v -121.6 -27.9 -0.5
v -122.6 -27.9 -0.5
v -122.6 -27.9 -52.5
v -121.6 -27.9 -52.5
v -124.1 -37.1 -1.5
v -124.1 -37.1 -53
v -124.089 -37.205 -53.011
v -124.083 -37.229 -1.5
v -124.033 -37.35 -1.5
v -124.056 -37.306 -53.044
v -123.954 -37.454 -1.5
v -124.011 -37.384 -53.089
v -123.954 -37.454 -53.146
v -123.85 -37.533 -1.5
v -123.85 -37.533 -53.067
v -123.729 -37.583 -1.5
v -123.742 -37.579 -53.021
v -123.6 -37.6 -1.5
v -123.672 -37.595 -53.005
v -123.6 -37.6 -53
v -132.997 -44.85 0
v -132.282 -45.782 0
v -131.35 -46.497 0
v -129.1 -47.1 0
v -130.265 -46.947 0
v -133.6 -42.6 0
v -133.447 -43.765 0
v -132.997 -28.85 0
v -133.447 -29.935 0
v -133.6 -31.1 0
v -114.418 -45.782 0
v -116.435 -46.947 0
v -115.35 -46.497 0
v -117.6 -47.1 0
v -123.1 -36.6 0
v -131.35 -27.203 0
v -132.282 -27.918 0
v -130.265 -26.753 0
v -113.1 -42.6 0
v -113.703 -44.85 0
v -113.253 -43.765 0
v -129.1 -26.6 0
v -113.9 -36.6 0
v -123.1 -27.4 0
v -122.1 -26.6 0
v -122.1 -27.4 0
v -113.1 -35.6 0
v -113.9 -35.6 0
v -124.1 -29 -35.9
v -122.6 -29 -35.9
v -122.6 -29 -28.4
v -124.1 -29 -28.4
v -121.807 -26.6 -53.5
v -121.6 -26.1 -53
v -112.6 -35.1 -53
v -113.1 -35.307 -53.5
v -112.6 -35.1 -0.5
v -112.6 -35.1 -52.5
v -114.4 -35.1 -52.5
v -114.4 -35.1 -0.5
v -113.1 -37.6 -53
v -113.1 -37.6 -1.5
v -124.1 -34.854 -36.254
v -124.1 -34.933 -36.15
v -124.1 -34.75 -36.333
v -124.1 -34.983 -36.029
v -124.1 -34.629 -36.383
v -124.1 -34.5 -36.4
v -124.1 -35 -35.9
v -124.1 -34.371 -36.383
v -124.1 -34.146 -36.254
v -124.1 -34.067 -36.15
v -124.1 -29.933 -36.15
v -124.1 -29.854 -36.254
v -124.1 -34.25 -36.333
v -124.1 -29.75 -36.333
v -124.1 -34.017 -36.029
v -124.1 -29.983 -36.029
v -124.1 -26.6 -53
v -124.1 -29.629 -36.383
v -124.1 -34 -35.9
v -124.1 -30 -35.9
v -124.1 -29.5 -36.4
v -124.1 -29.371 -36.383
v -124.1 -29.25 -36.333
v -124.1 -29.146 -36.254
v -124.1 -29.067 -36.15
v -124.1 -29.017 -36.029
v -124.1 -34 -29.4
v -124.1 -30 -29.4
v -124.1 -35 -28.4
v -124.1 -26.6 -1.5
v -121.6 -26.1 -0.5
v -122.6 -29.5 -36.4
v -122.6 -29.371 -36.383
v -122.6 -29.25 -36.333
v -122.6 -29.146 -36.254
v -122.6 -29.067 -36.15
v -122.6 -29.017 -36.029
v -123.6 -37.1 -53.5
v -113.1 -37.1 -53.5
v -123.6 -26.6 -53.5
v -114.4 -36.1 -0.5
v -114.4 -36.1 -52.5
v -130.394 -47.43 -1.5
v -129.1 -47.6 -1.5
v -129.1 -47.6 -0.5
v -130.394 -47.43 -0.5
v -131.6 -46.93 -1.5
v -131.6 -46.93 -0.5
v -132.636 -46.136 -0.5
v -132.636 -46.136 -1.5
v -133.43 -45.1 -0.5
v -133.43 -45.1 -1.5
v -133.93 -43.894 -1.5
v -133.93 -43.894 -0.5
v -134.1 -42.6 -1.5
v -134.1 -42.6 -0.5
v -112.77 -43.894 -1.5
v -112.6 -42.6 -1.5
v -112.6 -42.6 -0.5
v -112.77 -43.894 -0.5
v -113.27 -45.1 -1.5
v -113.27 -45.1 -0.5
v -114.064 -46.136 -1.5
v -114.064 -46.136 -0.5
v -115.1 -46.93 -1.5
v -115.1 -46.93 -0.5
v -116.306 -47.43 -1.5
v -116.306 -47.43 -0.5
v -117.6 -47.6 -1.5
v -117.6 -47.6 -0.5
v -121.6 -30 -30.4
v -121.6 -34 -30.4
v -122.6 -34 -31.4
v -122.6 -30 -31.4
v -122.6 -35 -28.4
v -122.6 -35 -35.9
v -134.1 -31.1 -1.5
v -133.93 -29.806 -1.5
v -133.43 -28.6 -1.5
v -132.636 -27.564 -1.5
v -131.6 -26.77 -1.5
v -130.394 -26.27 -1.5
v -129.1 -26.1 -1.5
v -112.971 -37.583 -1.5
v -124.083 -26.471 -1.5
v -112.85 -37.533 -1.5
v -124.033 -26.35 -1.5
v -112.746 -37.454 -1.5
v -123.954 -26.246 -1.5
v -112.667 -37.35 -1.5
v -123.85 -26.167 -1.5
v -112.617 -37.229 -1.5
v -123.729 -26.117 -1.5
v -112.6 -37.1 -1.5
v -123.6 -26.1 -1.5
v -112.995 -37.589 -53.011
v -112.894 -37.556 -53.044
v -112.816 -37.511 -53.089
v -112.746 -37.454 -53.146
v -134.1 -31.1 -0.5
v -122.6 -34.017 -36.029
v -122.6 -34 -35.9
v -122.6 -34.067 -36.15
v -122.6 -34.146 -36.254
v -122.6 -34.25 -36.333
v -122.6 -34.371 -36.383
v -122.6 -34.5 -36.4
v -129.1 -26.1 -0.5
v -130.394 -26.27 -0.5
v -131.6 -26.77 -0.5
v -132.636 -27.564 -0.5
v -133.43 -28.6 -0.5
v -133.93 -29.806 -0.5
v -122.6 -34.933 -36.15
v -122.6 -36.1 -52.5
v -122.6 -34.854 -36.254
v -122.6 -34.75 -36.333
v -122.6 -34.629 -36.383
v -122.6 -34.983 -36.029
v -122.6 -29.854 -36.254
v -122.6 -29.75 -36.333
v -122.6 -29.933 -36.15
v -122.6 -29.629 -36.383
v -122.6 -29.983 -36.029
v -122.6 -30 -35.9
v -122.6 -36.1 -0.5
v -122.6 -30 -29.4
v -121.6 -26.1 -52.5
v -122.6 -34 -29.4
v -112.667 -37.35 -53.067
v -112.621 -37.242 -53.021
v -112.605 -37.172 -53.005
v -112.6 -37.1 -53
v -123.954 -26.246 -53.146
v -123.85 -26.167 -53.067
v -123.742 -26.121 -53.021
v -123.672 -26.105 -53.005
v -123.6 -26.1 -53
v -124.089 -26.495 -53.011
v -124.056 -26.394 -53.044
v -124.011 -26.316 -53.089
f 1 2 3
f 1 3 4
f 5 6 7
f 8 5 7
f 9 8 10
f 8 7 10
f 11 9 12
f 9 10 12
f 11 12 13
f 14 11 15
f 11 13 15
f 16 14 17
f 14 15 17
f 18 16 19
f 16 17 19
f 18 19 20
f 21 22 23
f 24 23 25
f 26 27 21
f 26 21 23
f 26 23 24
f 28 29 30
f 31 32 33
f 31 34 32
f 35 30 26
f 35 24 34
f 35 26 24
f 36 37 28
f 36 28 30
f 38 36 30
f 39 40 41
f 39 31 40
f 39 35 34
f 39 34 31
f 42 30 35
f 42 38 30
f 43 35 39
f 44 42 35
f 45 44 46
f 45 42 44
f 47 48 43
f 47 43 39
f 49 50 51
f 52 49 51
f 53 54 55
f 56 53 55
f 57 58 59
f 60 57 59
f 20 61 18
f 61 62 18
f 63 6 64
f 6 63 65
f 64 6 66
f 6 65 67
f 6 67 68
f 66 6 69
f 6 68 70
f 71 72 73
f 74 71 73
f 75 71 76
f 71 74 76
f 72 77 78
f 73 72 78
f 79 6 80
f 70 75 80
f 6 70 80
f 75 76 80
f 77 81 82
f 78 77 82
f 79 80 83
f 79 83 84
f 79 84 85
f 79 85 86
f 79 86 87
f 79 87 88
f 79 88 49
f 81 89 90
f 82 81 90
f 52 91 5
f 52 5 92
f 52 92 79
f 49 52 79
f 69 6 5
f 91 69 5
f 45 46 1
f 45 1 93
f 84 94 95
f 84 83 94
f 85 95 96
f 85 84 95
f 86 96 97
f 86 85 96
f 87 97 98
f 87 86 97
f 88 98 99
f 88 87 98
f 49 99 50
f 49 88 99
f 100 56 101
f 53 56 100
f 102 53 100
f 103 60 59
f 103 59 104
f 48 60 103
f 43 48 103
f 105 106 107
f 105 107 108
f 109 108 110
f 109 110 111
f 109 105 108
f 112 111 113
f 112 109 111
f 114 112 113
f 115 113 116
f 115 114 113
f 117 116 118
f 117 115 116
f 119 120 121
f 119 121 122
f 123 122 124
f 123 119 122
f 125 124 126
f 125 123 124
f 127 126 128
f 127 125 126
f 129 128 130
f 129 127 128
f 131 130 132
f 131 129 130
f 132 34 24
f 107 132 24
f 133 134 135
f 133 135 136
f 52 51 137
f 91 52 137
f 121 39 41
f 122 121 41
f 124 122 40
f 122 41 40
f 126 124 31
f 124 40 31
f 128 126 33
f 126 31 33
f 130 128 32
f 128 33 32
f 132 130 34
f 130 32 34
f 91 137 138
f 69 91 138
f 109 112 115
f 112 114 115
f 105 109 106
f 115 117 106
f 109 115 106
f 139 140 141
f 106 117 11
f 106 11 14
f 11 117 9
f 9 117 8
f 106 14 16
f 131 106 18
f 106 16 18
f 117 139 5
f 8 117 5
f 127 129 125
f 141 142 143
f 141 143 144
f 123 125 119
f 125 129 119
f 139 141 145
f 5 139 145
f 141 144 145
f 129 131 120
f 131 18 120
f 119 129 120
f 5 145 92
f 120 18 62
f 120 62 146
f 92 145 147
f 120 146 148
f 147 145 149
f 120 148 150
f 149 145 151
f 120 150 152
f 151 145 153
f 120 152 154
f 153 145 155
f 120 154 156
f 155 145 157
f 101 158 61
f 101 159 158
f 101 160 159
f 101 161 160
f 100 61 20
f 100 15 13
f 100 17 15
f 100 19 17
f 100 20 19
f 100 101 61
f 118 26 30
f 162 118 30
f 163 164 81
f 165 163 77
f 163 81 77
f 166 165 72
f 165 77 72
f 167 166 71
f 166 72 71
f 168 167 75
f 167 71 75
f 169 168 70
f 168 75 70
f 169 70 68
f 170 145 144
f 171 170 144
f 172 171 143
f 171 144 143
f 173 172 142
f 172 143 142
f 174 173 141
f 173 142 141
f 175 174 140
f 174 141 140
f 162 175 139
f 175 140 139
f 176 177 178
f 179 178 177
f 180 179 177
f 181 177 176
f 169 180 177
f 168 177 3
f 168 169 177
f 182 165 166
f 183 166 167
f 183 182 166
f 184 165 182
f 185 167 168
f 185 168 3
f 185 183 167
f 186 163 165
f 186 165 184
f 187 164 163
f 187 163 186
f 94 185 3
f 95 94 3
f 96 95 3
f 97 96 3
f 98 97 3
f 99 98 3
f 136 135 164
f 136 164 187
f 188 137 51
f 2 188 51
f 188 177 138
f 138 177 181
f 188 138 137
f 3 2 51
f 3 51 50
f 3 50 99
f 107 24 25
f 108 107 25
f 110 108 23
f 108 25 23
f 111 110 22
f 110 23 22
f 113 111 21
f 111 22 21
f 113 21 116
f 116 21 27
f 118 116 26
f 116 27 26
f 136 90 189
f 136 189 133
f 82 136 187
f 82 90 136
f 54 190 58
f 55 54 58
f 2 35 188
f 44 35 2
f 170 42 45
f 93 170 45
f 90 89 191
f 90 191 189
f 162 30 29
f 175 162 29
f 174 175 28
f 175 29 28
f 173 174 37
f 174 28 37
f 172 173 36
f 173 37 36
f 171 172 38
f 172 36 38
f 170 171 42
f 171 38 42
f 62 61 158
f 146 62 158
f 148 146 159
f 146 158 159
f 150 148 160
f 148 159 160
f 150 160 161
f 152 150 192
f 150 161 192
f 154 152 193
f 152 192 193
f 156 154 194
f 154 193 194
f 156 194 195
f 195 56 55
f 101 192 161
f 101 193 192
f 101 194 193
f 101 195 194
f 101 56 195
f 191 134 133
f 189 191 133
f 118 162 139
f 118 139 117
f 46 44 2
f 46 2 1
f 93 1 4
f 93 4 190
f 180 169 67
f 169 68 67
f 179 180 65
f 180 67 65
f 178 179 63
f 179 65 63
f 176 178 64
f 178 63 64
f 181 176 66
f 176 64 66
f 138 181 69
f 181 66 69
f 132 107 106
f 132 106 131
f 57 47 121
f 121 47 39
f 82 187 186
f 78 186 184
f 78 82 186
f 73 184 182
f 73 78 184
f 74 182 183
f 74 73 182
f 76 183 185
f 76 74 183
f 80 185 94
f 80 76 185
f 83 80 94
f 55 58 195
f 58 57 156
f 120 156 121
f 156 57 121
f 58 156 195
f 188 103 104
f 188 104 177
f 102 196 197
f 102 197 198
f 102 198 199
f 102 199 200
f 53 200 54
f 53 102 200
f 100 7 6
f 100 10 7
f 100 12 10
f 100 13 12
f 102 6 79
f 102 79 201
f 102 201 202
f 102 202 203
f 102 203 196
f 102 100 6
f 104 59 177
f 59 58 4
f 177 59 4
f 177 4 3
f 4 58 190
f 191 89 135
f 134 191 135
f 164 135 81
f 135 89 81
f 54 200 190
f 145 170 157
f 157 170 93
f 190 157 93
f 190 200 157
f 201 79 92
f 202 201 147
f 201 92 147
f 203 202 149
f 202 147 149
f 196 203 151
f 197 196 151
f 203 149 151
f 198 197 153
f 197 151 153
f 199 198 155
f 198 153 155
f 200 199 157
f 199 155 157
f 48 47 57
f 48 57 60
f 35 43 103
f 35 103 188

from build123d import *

# Parameters (mm, degrees)
BOSS_EXTRUDE1_DEPTH = 52.5
BOSS_EXTRUDE2_DEPTH = 1.5
CUT_EXTRUDE1_REACH  = 73.793
SKETCH5_W           = 2
SKETCH5_H           = 4
BOSS_EXTRUDE3_DEPTH = 1
FILLET1_R           = 5
BOSS_EXTRUDE4_DEPTH = 1
CHAMFER3_SIZE       = 0.5
CHAMFER4_SIZE       = 1
FILLET3_R           = 0.5
FILLET4_R           = 0.5


with BuildPart() as part:
    # Sketch1 → Boss-Extrude1 (new body)
    with BuildSketch(Plane.XY):
        Polygon((-121.6, -26.1), (-124.1, -26.1), (-124.1, -37.6), (-112.6, -37.6), (-112.6, -35.1), (-114.4, -35.1), (-114.4, -36.1), (-122.6, -36.1), (-122.6, -27.9), (-121.6, -27.9), align=None)
    extrude(amount=-BOSS_EXTRUDE1_DEPTH)

    # Sketch2 → Boss-Extrude2 (add)
    with BuildSketch(Plane.XY):
        Polygon((-124.1, -26.1), (-134.1, -26.1), (-134.1, -47.6), (-112.6, -47.6), (-112.6, -37.6), (-124.1, -37.6), align=None)
    extrude(amount=-BOSS_EXTRUDE2_DEPTH)

    # Sketch4 → Cut-Extrude1 (cut, up to next)
    with BuildSketch(Plane(origin=(-122.6, 0, 0), x_dir=(0, 0, -1), z_dir=(1, 0, 0)), mode=Mode.PRIVATE) as cut_extrude1_sk1:
        Polygon((36.4, -30), (36.4, -29), (28.4, -29), (28.4, -35), (36.4, -35), (36.4, -34), (29.4, -34), (29.4, -30), align=None)
    cut_extrude1_tool1 = extrude(cut_extrude1_sk1.sketch, amount=-CUT_EXTRUDE1_REACH, mode=Mode.PRIVATE) & part.part
    add(cut_extrude1_tool1.solids().sort_by_distance((-122.6, -29.5, -36.3))[0], mode=Mode.SUBTRACT)

    # Sketch5 → Boss-Extrude3 (add)
    with BuildSketch(Plane(origin=(-122.6, 0, 0), x_dir=(0, 0, -1), z_dir=(1, 0, 0))):
        with Locations((30.4, -32)):
            Rectangle(SKETCH5_W, SKETCH5_H)
    extrude(amount=BOSS_EXTRUDE3_DEPTH)

    # Fillet1
    fillet1_edges = [part.edges().sort_by_distance(p)[0] for p in [
        (-112.6, -47.6, -0.75),
        (-134.1, -47.6, -0.75),
        (-134.1, -26.1, -0.75),
    ]]
    fillet(fillet1_edges, radius=FILLET1_R)

    # Sketch6 → Boss-Extrude4 (add)
    with BuildSketch(Plane(origin=(0, 0, -52.5), x_dir=(-1, 0, 0), z_dir=(0, 0, -1))):
        Polygon((112.6, -35.1), (112.6, -37.6), (124.1, -37.6), (124.1, -26.1), (121.6, -26.1), align=None)
    extrude(amount=BOSS_EXTRUDE4_DEPTH)

    # Chamfer3
    chamfer3_edges = [part.edges().sort_by_distance(p)[0] for p in [
        (-118.5, -36.1, 0),
        (-114.4, -35.6, 0),
        (-117.1, -30.6, -53.5),
        (-113.5, -35.1, 0),
        (-112.6, -36.35, -53.5),
        (-118.35, -37.6, -53.5),
        (-124.1, -31.85, -53.5),
        (-122.85, -26.1, -53.5),
        (-125.35, -26.1, 0),
        (-121.6, -27, 0),
        (-134.1, -36.85, 0),
        (-123.35, -47.6, 0),
        (-112.6, -38.85, 0),
        (-114.064466094, -46.135533906, 0),
        (-132.635533906, -46.135533906, 0),
        (-132.635533906, -27.564466094, 0),
        (-122.1, -27.9, 0),
        (-122.6, -32, 0),
    ]]
    chamfer(chamfer3_edges, length=CHAMFER3_SIZE)

    # Chamfer4
    chamfer4_edges = [part.edges().sort_by_distance(p)[0] for p in [
        (-121.6, -32, -31.4),
        (-121.6, -32, -29.4),
    ]]
    chamfer(chamfer4_edges, length=CHAMFER4_SIZE - 0.0001)  # a hair under: the kernel refuses the full size

    # Fillet3
    fillet3_edges = [part.edges().sort_by_distance(p)[0] for p in [
        (-123.35, -29, -36.4),
        (-123.35, -30, -36.4),
        (-123.35, -34, -36.4),
        (-123.35, -35, -36.4),
    ]]
    fillet(fillet3_edges, radius=FILLET3_R - 0.0001)  # a hair under: the kernel refuses the full size

    # Fillet4
    fillet4_edges = [part.edges().sort_by_distance(p)[0] for p in [
        (-124.1, -26.1, -27.25),
        (-124.1, -37.6, -27.25),
        (-112.6, -37.6, -27.25),
    ]]
    fillet(fillet4_edges, radius=FILLET4_R)


solid = part.part
